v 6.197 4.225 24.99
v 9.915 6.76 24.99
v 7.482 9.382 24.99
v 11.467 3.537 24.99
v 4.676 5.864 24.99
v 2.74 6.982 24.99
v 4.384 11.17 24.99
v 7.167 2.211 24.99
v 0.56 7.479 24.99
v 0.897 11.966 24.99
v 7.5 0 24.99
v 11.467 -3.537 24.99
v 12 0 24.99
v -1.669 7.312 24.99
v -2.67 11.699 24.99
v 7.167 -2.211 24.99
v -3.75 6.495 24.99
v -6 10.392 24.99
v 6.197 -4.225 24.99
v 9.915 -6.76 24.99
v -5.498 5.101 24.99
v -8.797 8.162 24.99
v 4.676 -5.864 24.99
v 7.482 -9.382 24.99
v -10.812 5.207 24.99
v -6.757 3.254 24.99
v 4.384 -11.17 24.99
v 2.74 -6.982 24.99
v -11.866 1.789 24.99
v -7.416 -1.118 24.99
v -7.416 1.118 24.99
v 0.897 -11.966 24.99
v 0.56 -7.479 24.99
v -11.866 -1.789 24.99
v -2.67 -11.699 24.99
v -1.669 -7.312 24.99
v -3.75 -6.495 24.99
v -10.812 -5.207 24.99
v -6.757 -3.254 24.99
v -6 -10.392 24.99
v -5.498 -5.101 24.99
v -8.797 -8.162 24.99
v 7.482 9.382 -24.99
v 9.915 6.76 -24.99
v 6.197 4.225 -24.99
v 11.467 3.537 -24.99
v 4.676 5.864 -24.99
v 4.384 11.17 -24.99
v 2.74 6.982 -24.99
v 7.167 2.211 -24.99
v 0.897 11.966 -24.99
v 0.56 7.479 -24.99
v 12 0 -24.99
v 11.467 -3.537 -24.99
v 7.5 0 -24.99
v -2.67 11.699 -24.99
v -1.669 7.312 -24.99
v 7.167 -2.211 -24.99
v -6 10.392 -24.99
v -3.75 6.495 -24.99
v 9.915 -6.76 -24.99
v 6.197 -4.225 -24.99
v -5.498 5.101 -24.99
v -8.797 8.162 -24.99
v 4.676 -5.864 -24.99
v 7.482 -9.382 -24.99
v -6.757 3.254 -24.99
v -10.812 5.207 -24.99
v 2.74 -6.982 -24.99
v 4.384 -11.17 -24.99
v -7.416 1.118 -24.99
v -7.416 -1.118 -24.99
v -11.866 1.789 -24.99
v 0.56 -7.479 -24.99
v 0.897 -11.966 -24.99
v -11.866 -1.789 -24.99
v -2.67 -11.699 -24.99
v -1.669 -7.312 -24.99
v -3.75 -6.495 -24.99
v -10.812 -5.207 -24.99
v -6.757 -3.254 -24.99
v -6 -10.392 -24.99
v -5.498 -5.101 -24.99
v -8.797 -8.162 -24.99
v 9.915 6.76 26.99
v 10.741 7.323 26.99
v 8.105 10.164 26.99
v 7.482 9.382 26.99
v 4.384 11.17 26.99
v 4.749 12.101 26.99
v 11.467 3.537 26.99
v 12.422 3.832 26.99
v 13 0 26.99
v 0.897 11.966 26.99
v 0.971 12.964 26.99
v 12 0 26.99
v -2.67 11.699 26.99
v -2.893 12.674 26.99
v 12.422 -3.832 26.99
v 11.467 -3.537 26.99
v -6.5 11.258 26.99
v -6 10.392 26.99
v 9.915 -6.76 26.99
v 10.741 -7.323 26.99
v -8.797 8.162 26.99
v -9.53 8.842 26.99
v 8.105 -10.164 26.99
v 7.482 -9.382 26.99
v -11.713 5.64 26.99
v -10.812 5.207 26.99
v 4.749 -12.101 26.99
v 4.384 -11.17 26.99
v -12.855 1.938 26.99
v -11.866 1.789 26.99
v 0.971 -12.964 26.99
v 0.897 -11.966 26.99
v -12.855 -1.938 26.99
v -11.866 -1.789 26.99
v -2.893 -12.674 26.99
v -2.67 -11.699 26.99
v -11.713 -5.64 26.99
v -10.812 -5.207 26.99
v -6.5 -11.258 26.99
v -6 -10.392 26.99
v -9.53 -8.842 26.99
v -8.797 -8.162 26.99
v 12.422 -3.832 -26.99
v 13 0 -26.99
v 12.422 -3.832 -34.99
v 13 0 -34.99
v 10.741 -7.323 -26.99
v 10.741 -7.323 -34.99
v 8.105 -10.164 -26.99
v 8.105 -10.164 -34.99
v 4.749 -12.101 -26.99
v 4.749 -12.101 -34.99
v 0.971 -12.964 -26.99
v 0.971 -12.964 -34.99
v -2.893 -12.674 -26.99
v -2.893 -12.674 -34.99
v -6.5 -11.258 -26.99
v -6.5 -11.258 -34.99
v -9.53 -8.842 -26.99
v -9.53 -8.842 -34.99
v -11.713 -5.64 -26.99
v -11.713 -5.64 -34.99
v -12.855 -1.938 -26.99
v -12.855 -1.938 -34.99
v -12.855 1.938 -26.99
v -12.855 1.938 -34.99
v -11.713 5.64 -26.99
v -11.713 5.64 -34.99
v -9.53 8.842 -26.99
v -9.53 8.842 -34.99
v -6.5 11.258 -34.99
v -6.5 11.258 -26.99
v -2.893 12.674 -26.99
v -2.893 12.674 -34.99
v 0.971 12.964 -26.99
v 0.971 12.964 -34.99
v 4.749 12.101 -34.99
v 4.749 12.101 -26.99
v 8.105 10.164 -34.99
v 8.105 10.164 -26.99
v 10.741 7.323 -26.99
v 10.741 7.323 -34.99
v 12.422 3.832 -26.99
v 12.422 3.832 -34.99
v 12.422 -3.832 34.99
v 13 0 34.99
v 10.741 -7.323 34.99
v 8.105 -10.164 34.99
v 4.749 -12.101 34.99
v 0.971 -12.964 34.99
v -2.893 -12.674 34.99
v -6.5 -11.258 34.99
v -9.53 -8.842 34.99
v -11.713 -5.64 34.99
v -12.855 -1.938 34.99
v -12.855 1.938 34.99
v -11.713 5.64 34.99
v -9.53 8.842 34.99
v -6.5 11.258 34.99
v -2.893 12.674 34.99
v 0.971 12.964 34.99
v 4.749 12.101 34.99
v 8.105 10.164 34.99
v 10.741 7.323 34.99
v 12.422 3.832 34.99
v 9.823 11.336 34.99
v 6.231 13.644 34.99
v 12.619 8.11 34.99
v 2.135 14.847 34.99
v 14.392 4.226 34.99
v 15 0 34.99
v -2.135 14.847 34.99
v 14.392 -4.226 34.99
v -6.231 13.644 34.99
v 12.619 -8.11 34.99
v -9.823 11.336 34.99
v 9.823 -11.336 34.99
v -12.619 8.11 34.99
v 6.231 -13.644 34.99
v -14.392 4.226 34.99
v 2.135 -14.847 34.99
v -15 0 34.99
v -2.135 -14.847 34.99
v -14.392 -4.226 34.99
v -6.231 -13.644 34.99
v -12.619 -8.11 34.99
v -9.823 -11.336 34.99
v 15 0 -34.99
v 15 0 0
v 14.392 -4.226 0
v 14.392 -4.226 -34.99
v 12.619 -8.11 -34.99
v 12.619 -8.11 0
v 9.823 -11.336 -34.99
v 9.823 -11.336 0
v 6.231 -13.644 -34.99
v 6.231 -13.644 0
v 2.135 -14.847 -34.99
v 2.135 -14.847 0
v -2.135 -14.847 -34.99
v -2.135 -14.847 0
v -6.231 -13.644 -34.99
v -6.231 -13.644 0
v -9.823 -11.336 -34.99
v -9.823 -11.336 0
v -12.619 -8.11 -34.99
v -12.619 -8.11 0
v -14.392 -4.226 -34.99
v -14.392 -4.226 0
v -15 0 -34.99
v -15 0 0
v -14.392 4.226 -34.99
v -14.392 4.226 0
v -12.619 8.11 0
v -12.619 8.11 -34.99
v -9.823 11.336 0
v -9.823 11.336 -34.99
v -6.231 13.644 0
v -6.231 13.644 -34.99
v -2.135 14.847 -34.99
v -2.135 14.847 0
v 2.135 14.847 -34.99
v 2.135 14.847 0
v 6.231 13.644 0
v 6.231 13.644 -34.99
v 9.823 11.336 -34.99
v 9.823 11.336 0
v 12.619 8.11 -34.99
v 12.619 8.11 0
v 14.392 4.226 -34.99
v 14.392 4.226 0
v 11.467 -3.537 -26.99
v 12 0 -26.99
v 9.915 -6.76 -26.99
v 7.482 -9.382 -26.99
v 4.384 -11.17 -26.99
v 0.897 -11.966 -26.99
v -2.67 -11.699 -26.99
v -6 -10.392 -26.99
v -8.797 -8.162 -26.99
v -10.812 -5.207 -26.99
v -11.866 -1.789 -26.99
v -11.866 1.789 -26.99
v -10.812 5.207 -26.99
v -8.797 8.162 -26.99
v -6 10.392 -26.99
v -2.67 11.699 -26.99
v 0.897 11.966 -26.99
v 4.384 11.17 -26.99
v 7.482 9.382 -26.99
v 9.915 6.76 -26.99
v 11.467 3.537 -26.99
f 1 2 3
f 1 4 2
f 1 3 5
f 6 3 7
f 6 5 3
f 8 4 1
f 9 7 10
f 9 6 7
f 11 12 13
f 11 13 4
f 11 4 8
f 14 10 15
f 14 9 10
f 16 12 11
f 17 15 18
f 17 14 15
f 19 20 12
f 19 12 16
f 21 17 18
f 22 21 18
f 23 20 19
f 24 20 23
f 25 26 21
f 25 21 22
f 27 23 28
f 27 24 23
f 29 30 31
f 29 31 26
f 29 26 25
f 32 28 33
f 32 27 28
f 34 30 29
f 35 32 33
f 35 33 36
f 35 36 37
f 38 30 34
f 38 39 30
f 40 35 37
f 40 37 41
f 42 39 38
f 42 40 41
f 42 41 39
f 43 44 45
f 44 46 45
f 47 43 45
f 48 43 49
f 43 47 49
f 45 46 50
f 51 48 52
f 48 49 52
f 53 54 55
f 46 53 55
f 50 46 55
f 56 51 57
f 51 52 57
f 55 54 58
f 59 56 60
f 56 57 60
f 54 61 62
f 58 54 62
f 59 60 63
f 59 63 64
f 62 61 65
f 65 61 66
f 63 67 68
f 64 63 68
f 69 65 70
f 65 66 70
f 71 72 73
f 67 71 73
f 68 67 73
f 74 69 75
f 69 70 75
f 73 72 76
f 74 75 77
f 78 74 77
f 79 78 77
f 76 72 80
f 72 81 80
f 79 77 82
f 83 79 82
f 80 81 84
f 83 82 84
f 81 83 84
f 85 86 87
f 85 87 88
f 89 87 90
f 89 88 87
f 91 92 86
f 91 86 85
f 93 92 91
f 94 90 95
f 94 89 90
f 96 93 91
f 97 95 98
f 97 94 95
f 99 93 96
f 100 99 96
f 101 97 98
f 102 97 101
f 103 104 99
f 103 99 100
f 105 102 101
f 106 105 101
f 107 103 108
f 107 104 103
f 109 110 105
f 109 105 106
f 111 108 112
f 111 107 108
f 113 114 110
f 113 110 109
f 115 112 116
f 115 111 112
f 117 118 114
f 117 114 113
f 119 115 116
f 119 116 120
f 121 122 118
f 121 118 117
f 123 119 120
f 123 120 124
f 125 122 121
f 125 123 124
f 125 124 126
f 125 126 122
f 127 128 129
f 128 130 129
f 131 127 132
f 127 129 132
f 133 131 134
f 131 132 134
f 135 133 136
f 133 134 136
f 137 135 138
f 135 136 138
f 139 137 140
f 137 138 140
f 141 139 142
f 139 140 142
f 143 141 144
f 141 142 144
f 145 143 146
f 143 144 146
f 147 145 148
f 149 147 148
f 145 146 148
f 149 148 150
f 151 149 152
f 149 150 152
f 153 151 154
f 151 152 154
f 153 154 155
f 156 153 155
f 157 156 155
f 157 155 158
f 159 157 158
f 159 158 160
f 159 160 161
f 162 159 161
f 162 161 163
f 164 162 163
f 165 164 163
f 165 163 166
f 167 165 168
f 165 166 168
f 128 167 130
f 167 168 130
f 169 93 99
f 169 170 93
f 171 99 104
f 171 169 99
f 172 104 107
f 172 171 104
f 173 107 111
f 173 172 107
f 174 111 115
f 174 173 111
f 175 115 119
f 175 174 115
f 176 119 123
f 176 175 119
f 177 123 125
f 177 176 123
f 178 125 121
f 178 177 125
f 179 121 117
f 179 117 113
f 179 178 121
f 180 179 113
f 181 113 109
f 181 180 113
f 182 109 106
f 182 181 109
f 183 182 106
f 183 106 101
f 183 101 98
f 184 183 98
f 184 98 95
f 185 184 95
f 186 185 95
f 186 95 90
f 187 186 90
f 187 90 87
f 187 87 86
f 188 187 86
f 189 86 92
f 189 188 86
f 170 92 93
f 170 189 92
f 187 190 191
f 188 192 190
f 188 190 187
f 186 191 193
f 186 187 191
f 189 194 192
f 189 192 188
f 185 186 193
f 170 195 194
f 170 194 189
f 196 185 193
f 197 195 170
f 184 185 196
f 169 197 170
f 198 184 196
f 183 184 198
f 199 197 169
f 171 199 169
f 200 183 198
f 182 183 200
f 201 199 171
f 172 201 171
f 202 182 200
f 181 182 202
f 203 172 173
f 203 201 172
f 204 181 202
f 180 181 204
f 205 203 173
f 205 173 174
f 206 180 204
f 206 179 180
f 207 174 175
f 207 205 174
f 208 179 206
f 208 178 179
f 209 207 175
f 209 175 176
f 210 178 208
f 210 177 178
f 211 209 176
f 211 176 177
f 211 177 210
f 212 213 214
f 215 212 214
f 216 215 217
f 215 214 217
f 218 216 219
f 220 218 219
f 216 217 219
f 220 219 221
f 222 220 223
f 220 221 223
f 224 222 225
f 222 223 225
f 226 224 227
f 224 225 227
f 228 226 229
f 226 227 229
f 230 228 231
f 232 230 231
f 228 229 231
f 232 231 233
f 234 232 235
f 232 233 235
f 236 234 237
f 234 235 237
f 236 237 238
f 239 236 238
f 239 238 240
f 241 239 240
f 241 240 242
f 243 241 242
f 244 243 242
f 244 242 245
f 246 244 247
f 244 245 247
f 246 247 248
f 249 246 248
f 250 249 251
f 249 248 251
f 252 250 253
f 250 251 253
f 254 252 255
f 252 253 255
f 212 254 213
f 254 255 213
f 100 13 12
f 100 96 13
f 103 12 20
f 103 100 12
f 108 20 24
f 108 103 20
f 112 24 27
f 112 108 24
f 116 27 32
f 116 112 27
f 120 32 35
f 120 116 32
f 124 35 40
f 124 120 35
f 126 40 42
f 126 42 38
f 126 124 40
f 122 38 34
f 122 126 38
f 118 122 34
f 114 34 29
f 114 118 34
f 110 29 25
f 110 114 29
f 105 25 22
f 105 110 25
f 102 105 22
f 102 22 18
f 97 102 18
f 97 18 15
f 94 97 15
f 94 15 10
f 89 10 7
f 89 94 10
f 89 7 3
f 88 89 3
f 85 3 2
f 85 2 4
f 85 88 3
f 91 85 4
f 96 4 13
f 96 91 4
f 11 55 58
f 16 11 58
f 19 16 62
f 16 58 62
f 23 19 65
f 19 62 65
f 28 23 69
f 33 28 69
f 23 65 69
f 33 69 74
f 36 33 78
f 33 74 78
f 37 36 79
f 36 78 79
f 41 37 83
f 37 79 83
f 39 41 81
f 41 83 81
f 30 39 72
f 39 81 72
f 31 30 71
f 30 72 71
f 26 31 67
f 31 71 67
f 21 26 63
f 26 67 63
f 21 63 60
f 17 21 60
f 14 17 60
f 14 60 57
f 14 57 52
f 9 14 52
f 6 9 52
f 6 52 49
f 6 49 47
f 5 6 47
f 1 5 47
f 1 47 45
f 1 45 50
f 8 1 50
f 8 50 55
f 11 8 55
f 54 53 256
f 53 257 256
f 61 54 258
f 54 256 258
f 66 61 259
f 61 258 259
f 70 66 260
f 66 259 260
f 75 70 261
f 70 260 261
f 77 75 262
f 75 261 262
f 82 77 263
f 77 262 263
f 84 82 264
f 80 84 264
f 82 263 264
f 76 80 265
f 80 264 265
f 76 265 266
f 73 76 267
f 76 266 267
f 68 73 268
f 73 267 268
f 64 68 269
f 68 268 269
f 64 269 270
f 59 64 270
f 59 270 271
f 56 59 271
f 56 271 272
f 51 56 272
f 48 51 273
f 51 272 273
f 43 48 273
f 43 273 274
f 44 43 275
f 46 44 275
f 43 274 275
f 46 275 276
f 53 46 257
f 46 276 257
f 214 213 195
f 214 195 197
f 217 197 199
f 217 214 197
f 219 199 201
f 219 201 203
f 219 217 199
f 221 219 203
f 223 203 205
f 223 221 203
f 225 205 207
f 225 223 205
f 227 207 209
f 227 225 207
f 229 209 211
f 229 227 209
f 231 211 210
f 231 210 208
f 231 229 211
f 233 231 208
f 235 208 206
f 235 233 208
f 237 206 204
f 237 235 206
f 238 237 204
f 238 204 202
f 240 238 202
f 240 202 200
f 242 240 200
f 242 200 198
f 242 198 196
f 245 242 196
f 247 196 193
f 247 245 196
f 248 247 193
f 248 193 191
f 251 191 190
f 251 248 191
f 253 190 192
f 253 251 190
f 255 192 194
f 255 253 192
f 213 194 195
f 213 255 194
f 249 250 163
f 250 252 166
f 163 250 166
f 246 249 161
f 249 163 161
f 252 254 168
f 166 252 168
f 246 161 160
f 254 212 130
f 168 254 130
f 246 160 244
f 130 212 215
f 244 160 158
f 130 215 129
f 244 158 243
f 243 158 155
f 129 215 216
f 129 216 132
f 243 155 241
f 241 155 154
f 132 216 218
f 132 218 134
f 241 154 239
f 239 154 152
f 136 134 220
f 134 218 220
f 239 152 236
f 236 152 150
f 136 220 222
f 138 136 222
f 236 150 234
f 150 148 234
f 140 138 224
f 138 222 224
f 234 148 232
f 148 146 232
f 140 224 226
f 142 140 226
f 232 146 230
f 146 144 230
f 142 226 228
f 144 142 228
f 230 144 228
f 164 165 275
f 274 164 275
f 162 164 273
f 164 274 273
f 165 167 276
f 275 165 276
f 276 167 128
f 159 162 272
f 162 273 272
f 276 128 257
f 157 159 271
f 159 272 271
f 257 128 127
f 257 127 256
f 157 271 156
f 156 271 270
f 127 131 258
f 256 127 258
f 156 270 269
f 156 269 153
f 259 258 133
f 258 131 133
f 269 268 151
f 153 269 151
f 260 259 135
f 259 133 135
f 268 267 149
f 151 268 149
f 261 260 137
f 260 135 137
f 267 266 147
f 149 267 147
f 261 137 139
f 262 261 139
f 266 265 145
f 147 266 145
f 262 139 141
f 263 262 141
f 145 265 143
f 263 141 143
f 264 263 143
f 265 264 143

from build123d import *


with BuildPart() as part:
    # Эскиз1 → Повернуть1 (revolve)
    with BuildSketch(Plane(origin=(0, 0, 0), x_dir=(1, 0, 0), z_dir=(0, 1, 0))):
        Polygon((15, 0), (7.5, 0), (7.5, -24.990014613), (12, -24.990014613), (12, -26.990014613), (13, -26.990014613), (13, -34.990014613), (15, -34.990014613), align=None)
    revolve(axis=Axis((0, 0, 1005.29300139), (0, 0, -1)))

    # Зеркальное отражение1: part across plane


with BuildPart() as part_1:
    add(part.part)
    add(part.part.mirror(Plane(origin=(15, 0, 0), x_dir=(1, 0, 0), z_dir=(0, 0, -1))))


solid = part_1.part
